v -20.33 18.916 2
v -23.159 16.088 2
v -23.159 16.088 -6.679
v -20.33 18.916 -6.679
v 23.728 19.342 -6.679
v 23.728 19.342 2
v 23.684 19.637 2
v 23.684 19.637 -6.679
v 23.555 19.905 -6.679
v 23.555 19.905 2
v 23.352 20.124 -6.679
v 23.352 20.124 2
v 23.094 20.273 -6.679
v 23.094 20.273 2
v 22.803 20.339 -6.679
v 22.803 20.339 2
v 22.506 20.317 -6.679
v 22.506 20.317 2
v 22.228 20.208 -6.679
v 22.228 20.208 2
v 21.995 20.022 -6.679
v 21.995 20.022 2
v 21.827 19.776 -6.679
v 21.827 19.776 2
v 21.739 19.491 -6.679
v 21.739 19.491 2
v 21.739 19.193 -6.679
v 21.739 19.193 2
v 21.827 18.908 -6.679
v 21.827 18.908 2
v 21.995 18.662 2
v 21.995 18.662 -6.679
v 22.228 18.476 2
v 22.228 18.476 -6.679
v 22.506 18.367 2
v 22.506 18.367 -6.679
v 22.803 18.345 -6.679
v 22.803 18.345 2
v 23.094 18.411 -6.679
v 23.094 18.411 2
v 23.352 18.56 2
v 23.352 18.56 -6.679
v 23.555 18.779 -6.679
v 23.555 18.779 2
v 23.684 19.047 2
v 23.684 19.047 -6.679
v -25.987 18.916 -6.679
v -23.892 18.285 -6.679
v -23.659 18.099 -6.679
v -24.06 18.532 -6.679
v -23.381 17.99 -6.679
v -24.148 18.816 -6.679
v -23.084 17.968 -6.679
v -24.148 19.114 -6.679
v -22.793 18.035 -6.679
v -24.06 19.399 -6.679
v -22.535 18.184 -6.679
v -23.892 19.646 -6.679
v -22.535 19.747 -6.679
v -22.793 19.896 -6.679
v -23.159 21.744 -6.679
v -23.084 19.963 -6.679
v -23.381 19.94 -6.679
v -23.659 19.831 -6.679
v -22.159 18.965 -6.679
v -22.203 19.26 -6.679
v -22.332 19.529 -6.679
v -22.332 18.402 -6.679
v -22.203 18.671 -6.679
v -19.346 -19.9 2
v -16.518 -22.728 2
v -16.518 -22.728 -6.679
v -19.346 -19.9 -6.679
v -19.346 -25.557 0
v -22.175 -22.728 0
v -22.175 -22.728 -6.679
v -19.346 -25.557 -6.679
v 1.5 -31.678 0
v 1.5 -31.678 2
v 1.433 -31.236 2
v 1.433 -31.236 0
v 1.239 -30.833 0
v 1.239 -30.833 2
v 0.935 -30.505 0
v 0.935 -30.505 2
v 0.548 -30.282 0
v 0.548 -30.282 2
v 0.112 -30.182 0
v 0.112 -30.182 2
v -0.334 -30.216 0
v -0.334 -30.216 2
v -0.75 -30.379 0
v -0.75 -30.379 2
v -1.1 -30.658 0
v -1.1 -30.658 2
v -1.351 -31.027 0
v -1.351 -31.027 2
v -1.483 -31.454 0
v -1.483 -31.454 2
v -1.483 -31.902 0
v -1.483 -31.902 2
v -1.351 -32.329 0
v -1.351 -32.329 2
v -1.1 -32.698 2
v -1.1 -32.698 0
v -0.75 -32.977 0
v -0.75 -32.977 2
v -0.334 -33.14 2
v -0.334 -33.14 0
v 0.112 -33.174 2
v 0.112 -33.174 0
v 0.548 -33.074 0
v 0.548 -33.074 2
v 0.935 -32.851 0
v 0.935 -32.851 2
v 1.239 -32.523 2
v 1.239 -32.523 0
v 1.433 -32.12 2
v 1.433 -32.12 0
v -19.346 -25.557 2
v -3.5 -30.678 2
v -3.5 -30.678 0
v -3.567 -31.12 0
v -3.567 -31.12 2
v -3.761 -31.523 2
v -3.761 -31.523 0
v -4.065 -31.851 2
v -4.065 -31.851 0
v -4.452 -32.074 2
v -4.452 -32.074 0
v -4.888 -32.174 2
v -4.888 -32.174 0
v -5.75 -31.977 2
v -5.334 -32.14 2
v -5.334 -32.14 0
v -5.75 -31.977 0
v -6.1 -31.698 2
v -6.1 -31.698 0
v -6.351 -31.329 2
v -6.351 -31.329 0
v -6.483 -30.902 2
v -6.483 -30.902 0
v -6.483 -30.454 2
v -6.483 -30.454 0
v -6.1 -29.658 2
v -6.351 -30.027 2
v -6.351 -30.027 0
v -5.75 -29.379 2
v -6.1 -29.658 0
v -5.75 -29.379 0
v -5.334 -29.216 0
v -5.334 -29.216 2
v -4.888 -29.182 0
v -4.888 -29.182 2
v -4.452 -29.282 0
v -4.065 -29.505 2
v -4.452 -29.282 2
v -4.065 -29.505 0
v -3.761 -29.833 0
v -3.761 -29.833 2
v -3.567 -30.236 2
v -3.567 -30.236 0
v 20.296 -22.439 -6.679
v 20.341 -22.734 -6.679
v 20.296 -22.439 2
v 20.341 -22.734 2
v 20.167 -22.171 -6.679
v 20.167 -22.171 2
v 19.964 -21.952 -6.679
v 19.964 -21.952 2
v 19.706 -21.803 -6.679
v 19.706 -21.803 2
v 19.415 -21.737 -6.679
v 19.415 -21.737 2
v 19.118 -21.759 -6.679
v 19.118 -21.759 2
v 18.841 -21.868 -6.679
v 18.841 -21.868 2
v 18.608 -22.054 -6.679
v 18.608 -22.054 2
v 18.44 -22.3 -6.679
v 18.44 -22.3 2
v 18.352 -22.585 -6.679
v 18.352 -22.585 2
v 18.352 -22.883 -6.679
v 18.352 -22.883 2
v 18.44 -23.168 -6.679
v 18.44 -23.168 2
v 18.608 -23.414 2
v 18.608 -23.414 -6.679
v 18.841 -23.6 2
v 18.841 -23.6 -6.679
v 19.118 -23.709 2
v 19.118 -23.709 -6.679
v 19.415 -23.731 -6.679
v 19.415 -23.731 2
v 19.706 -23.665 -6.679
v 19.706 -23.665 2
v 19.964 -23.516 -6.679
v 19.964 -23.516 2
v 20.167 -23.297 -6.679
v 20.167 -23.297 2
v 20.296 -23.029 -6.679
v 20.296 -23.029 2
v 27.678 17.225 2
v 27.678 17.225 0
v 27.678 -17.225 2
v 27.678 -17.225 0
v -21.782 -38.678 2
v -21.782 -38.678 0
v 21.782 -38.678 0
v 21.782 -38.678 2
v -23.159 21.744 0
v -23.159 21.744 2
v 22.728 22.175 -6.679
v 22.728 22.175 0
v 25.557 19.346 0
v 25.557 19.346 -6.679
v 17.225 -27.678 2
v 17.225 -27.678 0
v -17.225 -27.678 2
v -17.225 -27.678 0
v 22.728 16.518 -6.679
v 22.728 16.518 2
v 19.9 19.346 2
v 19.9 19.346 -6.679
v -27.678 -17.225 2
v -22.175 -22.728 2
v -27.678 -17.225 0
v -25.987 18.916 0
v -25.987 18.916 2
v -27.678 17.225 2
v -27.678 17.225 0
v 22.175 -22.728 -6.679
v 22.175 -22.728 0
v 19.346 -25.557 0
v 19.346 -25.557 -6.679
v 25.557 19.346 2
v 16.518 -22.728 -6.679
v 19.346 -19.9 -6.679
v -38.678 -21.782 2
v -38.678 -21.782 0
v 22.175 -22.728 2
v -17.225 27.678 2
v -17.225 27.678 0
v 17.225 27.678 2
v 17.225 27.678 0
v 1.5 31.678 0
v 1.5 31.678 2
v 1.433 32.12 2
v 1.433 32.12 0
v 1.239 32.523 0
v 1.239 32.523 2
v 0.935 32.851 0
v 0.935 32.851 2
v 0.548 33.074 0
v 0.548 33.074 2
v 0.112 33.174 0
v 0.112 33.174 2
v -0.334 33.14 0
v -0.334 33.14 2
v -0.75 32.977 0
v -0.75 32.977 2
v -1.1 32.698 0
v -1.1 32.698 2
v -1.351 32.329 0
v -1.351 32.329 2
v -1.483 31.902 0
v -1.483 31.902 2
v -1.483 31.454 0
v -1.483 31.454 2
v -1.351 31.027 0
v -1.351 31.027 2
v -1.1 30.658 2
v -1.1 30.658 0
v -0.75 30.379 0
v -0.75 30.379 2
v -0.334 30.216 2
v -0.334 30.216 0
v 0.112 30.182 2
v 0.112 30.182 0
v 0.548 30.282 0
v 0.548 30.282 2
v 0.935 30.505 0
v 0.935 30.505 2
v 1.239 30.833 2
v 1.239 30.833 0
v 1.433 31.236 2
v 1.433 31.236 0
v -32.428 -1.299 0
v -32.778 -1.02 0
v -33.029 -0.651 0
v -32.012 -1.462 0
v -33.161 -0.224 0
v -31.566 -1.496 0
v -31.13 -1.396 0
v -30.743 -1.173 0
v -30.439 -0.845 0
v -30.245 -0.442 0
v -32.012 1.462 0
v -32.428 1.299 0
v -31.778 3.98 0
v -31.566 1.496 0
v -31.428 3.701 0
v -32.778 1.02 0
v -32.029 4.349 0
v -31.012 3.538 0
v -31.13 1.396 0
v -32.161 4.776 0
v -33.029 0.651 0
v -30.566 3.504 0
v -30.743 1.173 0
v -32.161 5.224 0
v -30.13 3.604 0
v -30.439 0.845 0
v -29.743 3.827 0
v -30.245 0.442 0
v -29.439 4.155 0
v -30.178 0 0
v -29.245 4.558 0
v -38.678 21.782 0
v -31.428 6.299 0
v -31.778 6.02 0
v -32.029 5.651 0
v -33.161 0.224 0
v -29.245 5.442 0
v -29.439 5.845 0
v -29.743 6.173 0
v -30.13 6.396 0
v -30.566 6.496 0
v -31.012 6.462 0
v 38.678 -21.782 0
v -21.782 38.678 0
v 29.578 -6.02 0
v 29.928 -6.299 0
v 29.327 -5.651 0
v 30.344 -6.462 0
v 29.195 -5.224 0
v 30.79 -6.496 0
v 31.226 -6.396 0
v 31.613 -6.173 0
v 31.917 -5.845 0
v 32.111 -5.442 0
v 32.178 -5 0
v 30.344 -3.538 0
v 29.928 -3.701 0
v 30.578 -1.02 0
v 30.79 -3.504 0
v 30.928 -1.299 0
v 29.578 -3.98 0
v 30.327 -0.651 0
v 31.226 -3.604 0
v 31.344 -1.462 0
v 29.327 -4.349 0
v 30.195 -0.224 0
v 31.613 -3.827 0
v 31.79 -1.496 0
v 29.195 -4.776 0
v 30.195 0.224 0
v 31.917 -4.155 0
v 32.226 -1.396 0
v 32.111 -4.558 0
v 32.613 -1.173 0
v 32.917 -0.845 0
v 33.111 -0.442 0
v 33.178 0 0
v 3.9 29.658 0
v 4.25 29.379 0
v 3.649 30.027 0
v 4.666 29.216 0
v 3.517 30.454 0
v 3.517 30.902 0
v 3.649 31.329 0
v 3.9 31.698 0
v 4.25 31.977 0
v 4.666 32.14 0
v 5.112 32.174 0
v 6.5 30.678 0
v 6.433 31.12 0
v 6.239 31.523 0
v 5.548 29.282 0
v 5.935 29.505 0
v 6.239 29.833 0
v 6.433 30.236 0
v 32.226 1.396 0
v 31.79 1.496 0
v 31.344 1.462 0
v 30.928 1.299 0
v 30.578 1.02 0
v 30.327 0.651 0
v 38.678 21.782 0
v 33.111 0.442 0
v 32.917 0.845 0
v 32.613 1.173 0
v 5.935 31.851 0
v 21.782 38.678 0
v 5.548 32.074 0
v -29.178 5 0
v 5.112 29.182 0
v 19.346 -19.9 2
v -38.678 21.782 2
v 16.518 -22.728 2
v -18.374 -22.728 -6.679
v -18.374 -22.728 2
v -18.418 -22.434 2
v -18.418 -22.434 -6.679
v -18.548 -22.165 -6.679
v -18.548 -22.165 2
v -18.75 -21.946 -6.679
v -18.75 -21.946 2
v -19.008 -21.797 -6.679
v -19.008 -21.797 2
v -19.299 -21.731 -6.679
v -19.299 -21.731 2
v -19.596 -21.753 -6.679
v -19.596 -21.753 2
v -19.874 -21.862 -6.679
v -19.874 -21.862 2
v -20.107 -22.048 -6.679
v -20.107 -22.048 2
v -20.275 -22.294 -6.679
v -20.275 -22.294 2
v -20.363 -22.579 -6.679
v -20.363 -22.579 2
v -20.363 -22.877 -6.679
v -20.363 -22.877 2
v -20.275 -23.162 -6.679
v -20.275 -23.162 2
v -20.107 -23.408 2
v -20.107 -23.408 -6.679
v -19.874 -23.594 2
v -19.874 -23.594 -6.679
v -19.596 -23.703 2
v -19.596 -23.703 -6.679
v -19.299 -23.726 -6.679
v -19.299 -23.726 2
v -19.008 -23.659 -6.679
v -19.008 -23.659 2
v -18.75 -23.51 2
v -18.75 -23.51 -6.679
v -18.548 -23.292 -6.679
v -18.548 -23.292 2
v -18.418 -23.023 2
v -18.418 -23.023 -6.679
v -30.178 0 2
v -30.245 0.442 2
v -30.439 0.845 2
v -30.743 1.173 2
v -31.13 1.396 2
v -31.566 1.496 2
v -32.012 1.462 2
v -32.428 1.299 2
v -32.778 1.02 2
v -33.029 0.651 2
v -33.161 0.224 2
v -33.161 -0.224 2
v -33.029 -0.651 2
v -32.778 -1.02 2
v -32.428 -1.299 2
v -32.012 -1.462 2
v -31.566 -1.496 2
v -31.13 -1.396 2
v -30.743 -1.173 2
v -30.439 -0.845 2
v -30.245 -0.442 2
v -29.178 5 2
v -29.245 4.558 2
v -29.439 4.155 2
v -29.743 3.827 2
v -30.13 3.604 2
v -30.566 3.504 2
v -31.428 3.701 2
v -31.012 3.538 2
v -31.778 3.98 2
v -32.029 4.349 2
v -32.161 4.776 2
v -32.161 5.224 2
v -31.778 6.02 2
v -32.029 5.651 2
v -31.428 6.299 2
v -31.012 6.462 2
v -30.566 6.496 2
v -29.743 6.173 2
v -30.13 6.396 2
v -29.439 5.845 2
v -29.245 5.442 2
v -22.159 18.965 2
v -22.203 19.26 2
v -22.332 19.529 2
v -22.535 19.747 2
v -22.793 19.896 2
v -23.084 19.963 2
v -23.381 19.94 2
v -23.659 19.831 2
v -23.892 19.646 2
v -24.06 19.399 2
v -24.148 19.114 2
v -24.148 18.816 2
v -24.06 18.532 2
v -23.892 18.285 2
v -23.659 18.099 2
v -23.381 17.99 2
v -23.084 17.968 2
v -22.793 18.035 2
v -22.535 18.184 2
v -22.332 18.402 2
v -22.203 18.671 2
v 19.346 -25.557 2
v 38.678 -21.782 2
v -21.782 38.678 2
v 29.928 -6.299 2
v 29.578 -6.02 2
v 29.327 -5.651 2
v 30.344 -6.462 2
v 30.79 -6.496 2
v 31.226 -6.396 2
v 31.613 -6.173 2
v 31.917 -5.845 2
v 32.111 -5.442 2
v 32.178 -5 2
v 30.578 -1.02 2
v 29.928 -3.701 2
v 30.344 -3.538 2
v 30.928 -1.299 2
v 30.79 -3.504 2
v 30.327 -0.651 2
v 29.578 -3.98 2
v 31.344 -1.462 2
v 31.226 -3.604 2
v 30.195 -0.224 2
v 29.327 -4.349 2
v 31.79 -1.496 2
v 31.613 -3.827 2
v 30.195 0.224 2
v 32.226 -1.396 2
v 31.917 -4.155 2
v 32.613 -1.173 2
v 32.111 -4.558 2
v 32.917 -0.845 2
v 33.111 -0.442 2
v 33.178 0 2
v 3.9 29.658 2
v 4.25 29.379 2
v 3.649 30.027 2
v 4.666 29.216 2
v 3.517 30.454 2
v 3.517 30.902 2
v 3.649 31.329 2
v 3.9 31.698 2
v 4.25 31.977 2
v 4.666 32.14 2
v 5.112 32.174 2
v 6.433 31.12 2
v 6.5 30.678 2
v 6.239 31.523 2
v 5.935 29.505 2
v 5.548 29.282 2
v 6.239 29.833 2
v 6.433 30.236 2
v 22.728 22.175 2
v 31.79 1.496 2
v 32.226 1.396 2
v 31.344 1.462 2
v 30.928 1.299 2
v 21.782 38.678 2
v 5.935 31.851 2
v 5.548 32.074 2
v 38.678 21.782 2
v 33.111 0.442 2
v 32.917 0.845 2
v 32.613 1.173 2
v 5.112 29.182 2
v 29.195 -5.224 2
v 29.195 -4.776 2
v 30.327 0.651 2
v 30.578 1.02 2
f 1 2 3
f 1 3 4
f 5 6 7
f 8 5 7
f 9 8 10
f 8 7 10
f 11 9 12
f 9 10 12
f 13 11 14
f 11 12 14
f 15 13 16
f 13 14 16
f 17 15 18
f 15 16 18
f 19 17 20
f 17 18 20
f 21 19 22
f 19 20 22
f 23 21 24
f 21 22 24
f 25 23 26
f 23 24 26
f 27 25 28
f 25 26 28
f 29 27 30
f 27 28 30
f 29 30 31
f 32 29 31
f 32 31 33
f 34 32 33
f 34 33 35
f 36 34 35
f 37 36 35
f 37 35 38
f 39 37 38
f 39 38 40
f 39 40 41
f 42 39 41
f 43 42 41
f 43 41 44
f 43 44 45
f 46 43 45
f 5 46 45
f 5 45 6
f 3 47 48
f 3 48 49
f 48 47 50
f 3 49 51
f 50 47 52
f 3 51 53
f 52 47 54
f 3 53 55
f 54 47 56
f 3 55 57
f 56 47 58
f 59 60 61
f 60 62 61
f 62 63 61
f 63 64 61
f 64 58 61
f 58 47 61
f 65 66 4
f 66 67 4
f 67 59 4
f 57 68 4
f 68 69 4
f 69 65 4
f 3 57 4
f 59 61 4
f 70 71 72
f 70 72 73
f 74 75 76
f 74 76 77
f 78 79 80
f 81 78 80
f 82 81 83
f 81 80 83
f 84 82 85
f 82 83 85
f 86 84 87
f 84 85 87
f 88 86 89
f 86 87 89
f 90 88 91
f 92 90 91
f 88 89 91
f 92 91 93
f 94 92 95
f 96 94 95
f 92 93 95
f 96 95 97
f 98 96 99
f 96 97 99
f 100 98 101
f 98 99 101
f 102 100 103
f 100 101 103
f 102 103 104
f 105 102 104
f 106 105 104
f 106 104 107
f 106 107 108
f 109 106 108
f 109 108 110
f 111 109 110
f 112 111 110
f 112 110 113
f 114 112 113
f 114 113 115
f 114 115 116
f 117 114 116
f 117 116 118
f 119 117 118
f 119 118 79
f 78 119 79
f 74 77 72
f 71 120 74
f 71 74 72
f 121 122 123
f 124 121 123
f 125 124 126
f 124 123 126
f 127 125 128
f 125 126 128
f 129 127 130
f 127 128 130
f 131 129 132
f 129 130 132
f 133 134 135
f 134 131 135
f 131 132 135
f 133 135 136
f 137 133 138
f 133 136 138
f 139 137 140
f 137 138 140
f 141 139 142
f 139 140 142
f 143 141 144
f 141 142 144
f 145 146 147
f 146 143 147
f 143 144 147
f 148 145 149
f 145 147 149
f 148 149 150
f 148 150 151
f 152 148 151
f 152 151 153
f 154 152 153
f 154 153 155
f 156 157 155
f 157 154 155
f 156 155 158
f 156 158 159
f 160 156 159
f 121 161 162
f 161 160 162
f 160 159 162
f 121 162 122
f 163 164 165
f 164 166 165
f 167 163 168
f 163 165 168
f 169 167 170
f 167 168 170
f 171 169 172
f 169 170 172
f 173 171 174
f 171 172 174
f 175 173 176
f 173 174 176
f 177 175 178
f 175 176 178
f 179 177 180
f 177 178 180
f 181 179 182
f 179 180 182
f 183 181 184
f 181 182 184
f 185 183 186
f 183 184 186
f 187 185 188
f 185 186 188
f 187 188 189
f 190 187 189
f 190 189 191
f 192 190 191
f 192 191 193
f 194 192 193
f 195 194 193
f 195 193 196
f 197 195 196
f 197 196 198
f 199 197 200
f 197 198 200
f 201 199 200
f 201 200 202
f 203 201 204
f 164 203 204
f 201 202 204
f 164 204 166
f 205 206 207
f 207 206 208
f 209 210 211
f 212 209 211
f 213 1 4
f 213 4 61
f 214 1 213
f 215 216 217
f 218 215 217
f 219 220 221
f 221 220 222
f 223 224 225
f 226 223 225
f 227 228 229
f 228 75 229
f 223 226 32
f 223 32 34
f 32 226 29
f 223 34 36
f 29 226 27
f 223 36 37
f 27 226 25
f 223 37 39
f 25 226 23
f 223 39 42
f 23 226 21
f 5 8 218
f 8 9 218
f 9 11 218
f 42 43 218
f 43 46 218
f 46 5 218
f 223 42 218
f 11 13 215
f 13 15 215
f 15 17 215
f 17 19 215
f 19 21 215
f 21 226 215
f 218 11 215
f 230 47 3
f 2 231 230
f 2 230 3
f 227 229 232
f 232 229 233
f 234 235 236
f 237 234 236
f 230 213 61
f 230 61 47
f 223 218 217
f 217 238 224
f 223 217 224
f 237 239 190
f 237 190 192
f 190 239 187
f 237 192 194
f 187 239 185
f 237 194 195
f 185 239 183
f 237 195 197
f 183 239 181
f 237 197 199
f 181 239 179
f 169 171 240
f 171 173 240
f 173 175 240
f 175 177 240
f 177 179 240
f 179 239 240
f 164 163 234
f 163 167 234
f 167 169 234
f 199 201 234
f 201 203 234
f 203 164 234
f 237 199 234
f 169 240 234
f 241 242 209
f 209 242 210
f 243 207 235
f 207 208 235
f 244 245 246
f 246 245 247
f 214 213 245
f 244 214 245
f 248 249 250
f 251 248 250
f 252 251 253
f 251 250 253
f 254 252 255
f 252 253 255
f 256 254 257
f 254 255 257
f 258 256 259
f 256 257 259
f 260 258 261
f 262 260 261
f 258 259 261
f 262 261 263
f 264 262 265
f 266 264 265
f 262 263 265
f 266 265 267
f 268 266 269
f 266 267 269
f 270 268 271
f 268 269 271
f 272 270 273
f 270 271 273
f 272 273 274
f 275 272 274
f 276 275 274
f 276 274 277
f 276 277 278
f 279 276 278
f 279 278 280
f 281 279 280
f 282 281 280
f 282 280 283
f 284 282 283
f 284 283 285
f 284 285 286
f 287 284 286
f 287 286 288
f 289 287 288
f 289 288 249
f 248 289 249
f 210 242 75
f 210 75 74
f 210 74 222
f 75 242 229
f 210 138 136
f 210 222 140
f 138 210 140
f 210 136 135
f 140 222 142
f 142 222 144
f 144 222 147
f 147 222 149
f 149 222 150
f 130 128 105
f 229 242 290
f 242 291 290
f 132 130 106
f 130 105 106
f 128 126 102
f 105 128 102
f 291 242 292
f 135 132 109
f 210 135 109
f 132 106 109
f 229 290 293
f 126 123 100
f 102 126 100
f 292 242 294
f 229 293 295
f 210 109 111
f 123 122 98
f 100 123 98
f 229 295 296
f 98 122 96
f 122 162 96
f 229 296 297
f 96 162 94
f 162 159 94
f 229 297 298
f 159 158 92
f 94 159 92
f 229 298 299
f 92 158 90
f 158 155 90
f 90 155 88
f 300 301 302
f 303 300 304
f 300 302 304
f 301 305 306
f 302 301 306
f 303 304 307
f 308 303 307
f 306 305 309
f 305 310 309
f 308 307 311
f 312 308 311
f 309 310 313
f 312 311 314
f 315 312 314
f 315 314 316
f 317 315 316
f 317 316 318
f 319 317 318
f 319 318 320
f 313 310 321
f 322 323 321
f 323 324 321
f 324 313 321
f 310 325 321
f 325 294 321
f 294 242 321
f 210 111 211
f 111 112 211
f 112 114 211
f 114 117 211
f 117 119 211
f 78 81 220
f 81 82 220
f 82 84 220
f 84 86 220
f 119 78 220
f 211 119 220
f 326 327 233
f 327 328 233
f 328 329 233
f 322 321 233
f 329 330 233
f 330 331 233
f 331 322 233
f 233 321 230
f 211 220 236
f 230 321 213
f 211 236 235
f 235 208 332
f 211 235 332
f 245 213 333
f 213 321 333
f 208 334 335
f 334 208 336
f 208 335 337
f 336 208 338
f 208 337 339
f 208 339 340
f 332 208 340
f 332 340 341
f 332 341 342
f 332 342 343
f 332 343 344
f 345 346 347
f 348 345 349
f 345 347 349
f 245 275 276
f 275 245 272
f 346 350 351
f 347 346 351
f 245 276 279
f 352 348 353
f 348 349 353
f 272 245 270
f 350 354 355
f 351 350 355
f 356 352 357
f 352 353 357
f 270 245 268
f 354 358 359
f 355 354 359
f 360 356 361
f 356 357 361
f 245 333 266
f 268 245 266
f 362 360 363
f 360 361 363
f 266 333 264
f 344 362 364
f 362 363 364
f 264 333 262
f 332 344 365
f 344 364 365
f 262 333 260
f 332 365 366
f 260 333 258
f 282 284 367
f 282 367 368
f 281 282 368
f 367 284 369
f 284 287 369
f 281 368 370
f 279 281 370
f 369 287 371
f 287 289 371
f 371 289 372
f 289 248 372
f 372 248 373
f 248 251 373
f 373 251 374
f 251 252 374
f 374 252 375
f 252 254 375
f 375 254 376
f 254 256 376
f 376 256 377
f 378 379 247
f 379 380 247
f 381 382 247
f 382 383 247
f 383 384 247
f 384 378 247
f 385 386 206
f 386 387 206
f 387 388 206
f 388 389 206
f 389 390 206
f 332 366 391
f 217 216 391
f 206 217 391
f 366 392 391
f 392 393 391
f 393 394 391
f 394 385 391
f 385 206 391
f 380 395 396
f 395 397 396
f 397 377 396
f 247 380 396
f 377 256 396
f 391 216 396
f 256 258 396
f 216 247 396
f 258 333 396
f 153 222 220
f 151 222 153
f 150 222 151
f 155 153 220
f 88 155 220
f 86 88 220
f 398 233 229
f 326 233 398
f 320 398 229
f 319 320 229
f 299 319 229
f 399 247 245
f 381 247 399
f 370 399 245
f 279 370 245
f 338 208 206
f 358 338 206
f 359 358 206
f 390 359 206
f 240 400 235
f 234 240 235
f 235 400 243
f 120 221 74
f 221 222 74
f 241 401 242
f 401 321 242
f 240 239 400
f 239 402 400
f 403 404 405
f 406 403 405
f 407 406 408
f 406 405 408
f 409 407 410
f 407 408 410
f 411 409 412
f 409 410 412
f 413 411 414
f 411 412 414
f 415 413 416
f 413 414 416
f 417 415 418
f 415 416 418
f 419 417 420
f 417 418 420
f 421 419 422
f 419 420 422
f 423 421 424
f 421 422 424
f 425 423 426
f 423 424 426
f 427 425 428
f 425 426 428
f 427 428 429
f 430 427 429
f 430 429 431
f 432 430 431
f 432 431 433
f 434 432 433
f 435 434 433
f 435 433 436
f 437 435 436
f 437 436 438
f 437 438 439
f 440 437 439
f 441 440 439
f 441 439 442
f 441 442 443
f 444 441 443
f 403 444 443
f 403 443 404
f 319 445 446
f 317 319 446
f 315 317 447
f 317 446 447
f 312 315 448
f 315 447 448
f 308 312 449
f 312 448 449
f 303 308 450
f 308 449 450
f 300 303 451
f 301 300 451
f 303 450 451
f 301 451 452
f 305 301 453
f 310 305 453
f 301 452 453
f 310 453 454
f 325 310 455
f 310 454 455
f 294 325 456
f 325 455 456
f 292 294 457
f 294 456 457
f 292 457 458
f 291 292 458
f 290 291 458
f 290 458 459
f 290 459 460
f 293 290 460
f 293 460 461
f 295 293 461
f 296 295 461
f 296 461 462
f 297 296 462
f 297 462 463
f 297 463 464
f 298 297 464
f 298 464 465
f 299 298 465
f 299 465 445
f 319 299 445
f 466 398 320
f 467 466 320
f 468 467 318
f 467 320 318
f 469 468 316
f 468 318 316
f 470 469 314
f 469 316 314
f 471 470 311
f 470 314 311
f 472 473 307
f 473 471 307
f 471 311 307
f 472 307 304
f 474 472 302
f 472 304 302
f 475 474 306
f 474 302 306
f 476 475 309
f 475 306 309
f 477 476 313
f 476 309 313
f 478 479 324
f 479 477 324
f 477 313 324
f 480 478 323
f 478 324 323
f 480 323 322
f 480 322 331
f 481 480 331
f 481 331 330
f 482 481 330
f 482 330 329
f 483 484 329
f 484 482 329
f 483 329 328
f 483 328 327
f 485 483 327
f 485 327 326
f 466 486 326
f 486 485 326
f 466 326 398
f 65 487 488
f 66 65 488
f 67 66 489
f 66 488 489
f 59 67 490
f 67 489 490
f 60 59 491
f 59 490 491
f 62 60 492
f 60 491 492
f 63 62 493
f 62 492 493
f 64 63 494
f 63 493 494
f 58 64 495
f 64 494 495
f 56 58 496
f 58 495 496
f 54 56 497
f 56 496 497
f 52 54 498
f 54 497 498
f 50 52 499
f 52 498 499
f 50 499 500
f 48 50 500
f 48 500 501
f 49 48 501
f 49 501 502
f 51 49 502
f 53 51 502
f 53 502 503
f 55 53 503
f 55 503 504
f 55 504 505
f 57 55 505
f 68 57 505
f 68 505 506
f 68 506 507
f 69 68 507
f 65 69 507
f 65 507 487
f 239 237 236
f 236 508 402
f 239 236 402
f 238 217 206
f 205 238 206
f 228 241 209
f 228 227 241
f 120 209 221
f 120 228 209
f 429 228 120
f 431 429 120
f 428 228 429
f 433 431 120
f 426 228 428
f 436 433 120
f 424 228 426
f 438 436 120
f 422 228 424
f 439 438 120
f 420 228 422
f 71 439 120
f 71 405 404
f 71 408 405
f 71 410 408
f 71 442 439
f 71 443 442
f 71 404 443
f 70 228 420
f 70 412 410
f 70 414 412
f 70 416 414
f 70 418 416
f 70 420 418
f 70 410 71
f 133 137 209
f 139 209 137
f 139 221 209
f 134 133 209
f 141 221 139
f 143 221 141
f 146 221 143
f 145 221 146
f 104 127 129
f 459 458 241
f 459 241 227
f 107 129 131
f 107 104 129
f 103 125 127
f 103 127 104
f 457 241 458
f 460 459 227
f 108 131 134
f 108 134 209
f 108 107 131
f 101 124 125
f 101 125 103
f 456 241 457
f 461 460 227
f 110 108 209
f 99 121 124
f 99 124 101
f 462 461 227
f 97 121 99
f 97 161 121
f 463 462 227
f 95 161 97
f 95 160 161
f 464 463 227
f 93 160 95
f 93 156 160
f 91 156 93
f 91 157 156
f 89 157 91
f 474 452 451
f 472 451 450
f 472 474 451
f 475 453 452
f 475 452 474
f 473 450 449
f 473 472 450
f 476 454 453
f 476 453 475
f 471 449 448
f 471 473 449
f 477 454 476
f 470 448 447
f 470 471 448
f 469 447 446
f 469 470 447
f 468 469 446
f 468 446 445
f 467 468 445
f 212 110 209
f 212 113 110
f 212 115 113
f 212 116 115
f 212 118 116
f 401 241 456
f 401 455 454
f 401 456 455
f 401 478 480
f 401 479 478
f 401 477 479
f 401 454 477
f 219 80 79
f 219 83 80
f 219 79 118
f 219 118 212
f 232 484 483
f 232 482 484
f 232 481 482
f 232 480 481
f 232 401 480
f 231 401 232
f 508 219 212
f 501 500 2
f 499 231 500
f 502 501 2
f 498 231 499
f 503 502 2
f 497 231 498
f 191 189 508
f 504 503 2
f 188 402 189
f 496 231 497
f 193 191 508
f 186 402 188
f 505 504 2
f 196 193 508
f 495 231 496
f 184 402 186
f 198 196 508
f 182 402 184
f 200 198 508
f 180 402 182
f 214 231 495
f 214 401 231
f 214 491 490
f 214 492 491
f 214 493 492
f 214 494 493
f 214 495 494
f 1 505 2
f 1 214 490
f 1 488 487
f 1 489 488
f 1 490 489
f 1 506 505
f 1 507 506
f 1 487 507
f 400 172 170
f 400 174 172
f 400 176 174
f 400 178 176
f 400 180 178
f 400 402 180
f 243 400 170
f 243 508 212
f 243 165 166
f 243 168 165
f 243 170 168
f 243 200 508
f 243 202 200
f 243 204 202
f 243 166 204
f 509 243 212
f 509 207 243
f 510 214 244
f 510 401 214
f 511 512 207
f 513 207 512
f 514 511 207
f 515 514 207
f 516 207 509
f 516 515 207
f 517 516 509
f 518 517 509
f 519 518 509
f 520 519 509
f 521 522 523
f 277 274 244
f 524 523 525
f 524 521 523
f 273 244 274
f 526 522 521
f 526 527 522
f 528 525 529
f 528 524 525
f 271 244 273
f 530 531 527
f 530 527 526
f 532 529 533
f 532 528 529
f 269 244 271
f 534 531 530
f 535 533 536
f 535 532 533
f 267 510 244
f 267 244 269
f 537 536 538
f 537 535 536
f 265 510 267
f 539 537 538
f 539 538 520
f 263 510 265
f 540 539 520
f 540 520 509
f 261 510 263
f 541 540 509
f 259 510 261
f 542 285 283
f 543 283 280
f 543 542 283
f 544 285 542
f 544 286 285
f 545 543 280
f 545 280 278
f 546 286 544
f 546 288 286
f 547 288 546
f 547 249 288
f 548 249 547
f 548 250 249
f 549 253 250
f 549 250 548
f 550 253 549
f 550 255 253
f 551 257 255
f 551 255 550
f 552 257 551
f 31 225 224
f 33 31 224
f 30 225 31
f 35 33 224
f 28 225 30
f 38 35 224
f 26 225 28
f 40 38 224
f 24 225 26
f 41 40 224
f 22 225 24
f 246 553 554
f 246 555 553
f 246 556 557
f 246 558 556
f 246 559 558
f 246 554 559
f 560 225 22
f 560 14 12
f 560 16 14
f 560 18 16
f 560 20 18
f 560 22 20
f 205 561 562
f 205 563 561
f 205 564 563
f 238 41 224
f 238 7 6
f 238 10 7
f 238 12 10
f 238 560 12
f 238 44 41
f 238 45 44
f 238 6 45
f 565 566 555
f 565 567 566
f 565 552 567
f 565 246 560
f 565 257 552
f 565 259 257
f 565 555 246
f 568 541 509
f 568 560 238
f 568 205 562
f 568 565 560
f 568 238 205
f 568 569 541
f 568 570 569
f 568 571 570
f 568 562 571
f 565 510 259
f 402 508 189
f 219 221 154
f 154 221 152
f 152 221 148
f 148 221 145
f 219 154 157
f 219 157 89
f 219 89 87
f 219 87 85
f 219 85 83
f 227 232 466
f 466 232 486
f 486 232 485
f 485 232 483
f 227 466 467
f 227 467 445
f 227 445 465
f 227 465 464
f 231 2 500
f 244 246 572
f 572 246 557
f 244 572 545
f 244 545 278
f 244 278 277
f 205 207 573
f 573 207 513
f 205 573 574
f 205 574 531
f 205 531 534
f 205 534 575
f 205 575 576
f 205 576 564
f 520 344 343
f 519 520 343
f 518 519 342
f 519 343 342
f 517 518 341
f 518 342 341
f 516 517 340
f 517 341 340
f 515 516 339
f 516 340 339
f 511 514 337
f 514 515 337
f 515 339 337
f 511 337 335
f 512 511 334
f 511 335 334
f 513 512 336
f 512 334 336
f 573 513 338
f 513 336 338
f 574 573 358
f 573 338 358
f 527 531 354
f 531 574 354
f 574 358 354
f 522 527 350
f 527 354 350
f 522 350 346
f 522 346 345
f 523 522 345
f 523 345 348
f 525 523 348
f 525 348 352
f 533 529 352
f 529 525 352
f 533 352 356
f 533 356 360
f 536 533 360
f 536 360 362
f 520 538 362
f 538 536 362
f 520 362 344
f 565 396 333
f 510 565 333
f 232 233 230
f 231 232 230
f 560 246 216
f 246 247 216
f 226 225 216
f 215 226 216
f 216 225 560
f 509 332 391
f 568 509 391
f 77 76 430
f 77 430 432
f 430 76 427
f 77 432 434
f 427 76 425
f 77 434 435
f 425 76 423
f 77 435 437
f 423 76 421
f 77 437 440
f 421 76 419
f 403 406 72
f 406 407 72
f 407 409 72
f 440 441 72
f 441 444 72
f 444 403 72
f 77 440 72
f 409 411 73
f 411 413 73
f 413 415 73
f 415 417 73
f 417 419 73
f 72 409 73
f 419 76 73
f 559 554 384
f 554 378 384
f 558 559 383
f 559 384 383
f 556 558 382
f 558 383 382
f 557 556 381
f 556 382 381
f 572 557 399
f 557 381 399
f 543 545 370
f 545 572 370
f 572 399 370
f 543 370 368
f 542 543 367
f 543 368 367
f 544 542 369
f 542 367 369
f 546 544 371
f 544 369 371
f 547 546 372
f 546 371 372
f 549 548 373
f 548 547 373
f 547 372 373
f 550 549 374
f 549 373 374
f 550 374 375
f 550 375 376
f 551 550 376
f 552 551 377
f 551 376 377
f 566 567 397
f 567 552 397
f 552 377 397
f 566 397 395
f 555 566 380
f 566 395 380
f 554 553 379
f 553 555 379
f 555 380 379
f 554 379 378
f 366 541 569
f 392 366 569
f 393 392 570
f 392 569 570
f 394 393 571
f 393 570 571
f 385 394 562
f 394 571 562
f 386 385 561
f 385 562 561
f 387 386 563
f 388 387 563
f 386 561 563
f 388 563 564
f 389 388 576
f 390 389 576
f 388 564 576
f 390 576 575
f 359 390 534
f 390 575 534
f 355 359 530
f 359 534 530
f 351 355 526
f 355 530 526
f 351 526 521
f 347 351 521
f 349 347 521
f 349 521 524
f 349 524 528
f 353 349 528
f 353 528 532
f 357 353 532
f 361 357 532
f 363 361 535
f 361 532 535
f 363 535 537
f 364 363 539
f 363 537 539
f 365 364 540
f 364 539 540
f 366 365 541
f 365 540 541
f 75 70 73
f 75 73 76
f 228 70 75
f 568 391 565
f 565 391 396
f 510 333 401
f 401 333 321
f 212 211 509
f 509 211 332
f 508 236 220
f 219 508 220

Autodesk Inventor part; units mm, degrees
ref_plane "YZ Plane" through (0, 0, 0) normal (1, 0, 0) x (0, 1, 0)
ref_plane "XZ Plane" through (0, 0, 0) normal (0, 1, 0) x (-1, 0, 0)
sketch "Эскиз1" plane through (0, 0, 0) normal (0, 0, 1) x (1, 0, 0)
  line L0 (-28.678, -17.6393) -> (-17.6393, -28.678) construction
  line L1 (-17.6393, -28.678) -> (-7, -28.678) construction
  line L2 (-7, -32.678) -> (-7, -28.678) construction
  line L3 (-3, -32.678) -> (-7, -32.678) construction
  line L4 (-3, -28.678) -> (-3, -32.678) construction
  line L5 (-3, -28.678) -> (17.6393, -28.678) construction
  line L6 (17.6393, -28.678) -> (28.678, -17.6393) construction
  line L7 (28.678, -17.6393) -> (28.678, -7) construction
  line L8 (32.678, -7) -> (28.678, -7) construction
  line L9 (32.678, -3) -> (32.678, -7) construction
  line L10 (28.678, -3) -> (32.678, -3) construction
  line L11 (28.678, -3) -> (28.678, 17.6393) construction
  line L12 (28.678, 17.6393) -> (17.6393, 28.678) construction
  line L13 (17.6393, 28.678) -> (7, 28.678) construction
  line L14 (7, 32.678) -> (7, 28.678) construction
  line L15 (3, 32.678) -> (7, 32.678) construction
  line L16 (3, 28.678) -> (3, 32.678) construction
  line L17 (3, 28.678) -> (-17.6393, 28.678) construction
  line L18 (-17.6393, 28.678) -> (-28.678, 17.6393) construction
  line L19 (-28.678, 17.6393) -> (-28.678, 7) construction
  line L20 (-32.678, 7) -> (-28.678, 7) construction
  line L21 (-32.678, 3) -> (-32.678, 7) construction
  line L22 (-28.678, 3) -> (-32.678, 3) construction
  line L23 (-28.678, 3) -> (-28.678, -17.6393) construction
  line L24 (-27.678, 17.2251) -> (-17.2251, 27.678) construction
  line L25 (-17.2251, 27.678) -> (17.2251, 27.678) construction
  line L26 (17.2251, 27.678) -> (27.678, 17.2251) construction
  line L27 (27.678, 17.2251) -> (27.678, -17.2251) construction
  line L28 (27.678, -17.2251) -> (17.2251, -27.678) construction
  line L29 (17.2251, -27.678) -> (-17.2251, -27.678) construction
  line L30 (-17.2251, -27.678) -> (-27.678, -17.2251) construction
  line L31 (-27.678, -17.2251) -> (-27.678, 17.2251) construction
  line L32 (38.678, 21.7815) -> (21.7815, 38.678)
  line L33 (21.7815, 38.678) -> (-21.7815, 38.678)
  line L34 (-21.7815, 38.678) -> (-38.678, 21.7815)
  line L35 (-38.678, 21.7815) -> (-38.678, -21.7815)
  line L36 (-38.678, -21.7815) -> (-21.7815, -38.678)
  line L37 (-21.7815, -38.678) -> (21.7815, -38.678)
  line L38 (21.7815, -38.678) -> (38.678, -21.7815)
  line L39 (38.678, -21.7815) -> (38.678, 21.7815)
  line L40 (17.2251, 27.678) -> (27.678, 17.2251)
  line L41 (27.678, 17.2251) -> (27.678, -17.2251)
  line L42 (27.678, -17.2251) -> (17.2251, -27.678)
  line L43 (17.2251, -27.678) -> (-17.2251, -27.678)
  line L44 (-17.2251, -27.678) -> (-27.678, -17.2251)
  line L45 (-27.678, -17.2251) -> (-27.678, 17.2251)
  line L46 (-27.678, 17.2251) -> (-17.2251, 27.678)
  line L47 (-17.2251, 27.678) -> (17.2251, 27.678)
  circle A0 centre (30.678, -5) radius 1.5
  circle A1 centre (5, 30.678) radius 1.5
  circle A2 centre (-30.678, 5) radius 1.5
  circle A3 centre (-5, -30.678) radius 1.5
  circle A4 centre (5, 30.678) radius 1 projected
  circle A5 centre (-30.678, 5) radius 1 projected
  circle A6 centre (30.678, -5) radius 1 projected
  circle A7 centre (-5, -30.678) radius 1 projected
  point P0 (0, 0)
  dimension "d0" = 11
  dimension "d1" = 11
  dimension "d4" = 3
  dimension "d5" = 3
  dimension "d6" = 3
  dimension "d7" = 3
extrude "Выдавливание2" add sketch "Эскиз1" along normal blind 2 contours L39 L38 L37 L36 L35 L34 L33 L32
sketch "Эскиз2" plane through (0, 0, 2) normal (0, 0, 1) x (1, 0, 0)
  line L0 (21.7815, 38.678) -> (-21.7815, 38.678) construction
  line L1 (-21.7815, 38.678) -> (-38.678, 21.7815) construction
  line L2 (-38.678, 21.7815) -> (-38.678, -21.7815) construction
  line L3 (-38.678, -21.7815) -> (-21.7815, -38.678) construction
  line L4 (-21.7815, -38.678) -> (21.7815, -38.678) construction
  line L5 (21.7815, -38.678) -> (38.678, -21.7815) construction
  line L6 (38.678, -21.7815) -> (38.678, 21.7815) construction
  line L7 (38.678, 21.7815) -> (21.7815, 38.678) construction
  line L8 (17.2251, 27.678) -> (27.678, 17.2251) construction
  line L9 (27.678, 17.2251) -> (27.678, -17.2251) construction
  line L10 (27.678, -17.2251) -> (17.2251, -27.678) construction
  line L11 (17.2251, -27.678) -> (-17.2251, -27.678) construction
  line L12 (-17.2251, -27.678) -> (-27.678, -17.2251) construction
  line L13 (-27.678, -17.2251) -> (-27.678, 17.2251) construction
  line L14 (-27.678, 17.2251) -> (-17.2251, 27.678) construction
  line L15 (-17.2251, 27.678) -> (17.2251, 27.678) construction
  circle A0 centre (-5, -30.678) radius 1.5 construction
  circle A1 centre (-30.678, 5) radius 1.5 construction
  circle A2 centre (5, 30.678) radius 1.5 construction
  circle A3 centre (30.678, -5) radius 1.5 construction
  line L16 (27.678, -17.2251) -> (17.2251, -27.678) projected
  line L17 (22.1749, -22.7283) -> (19.3464, -25.5567)
  line L18 (19.3464, -25.5567) -> (16.518, -22.7283)
  line L19 (16.518, -22.7283) -> (19.3464, -19.8998)
  line L20 (19.3464, -19.8998) -> (22.1749, -22.7283)
  line L21 (17.2251, -27.678) -> (-17.2251, -27.678) construction
  line L22 (0, -27.678) -> (0, 27.678) construction
  line L23 (27.678, 17.2251) -> (27.678, -17.2251) construction
  line L24 (27.678, 0) -> (-27.678, 0) construction
  line L25 (-27.678, -17.2251) -> (-27.678, 17.2251) construction
  line L26 (-22.1749, -22.7283) -> (-19.3464, -25.5567)
  line L27 (-19.3464, -25.5567) -> (-16.518, -22.7283)
  line L28 (-16.518, -22.7283) -> (-19.3464, -19.8998)
  line L29 (-19.3464, -19.8998) -> (-22.1749, -22.7283)
  line L30 (-27.678, 17.2251) -> (-17.2251, 27.678) construction
  line L31 (22.4516, -22.4516) -> (-22.4516, 22.4516) construction
  line L32 (27.678, 17.2251) -> (17.2251, 27.678) construction
  line L33 (22.7283, 22.1749) -> (25.5567, 19.3464)
  line L34 (19.8998, 19.3464) -> (22.7283, 22.1749)
  line L35 (22.7283, 16.518) -> (19.8998, 19.3464)
  line L36 (25.5567, 19.3464) -> (22.7283, 16.518)
  circle A4 centre (19.3407, -22.734) radius 1
  circle A5 centre (-19.3738, -22.7283) radius 1
  circle A6 centre (22.7283, 19.3419) radius 1
  line L37 (-23.1587, 16.0876) -> (-20.3302, 18.916)
  line L38 (-20.3302, 18.916) -> (-23.1587, 21.7444)
  line L39 (-23.1587, 21.7444) -> (-25.9871, 18.916)
  line L40 (-25.9871, 18.916) -> (-23.1587, 16.0876)
  circle A7 centre (-23.1587, 18.9654) radius 1
  point P0 (0, 0)
  dimension "d11" = 4
  dimension "d12" = 3
  dimension "d30" = 2
  dimension "d31" = 2
  dimension "d32" = 2
  dimension "d33" = 4
  dimension "d34" = 4
  dimension "d36" = 1
  dimension "d37" = 2
ref_plane "РабПлоскость1" through (-27.178, -27.178, -6.6792) normal (0, 0, 1) x (1, 0, 0)
extrude "Выдавливание3" add sketch "Эскиз2" against normal up to surface (8.6792 mm away)
sketch "Эскиз3" plane through (0, 0, 2) normal (0, 0, 1) x (1, 0, 0)
  circle A0 centre (-5, -30.678) radius 1.5 construction
  circle A1 centre (30.678, -5) radius 1.5 construction
  circle A2 centre (-30.678, 5) radius 1.5 construction
  circle A3 centre (5, 30.678) radius 1.5 construction
  line L0 (-17.2251, 27.678) -> (17.2251, 27.678) construction
  line L1 (0, 27.678) -> (0, -27.678) construction
  line L2 (17.2251, -27.678) -> (-17.2251, -27.678) construction
  line L3 (27.678, 17.2251) -> (27.678, -17.2251) construction
  line L4 (27.678, 0) -> (-27.678, 0) construction
  line L5 (-27.678, -17.2251) -> (-27.678, 17.2251) construction
  circle A4 centre (0, -31.678) radius 1.5
  circle A5 centre (31.678, 0) radius 1.5
  circle A6 centre (-31.678, 0) radius 1.5
  circle A7 centre (0, 31.678) radius 1.5
  point P0 (0, 0)
  dimension "d15" = 3
  dimension "d16" = 3
  dimension "d17" = 3
  dimension "d18" = 3
  dimension "d19" = 4
  dimension "d20" = 4
  dimension "d21" = 4
  dimension "d22" = 4
extrude "Выдавливание4" cut sketch "Эскиз3" against normal through all
properties part number "Середина"
